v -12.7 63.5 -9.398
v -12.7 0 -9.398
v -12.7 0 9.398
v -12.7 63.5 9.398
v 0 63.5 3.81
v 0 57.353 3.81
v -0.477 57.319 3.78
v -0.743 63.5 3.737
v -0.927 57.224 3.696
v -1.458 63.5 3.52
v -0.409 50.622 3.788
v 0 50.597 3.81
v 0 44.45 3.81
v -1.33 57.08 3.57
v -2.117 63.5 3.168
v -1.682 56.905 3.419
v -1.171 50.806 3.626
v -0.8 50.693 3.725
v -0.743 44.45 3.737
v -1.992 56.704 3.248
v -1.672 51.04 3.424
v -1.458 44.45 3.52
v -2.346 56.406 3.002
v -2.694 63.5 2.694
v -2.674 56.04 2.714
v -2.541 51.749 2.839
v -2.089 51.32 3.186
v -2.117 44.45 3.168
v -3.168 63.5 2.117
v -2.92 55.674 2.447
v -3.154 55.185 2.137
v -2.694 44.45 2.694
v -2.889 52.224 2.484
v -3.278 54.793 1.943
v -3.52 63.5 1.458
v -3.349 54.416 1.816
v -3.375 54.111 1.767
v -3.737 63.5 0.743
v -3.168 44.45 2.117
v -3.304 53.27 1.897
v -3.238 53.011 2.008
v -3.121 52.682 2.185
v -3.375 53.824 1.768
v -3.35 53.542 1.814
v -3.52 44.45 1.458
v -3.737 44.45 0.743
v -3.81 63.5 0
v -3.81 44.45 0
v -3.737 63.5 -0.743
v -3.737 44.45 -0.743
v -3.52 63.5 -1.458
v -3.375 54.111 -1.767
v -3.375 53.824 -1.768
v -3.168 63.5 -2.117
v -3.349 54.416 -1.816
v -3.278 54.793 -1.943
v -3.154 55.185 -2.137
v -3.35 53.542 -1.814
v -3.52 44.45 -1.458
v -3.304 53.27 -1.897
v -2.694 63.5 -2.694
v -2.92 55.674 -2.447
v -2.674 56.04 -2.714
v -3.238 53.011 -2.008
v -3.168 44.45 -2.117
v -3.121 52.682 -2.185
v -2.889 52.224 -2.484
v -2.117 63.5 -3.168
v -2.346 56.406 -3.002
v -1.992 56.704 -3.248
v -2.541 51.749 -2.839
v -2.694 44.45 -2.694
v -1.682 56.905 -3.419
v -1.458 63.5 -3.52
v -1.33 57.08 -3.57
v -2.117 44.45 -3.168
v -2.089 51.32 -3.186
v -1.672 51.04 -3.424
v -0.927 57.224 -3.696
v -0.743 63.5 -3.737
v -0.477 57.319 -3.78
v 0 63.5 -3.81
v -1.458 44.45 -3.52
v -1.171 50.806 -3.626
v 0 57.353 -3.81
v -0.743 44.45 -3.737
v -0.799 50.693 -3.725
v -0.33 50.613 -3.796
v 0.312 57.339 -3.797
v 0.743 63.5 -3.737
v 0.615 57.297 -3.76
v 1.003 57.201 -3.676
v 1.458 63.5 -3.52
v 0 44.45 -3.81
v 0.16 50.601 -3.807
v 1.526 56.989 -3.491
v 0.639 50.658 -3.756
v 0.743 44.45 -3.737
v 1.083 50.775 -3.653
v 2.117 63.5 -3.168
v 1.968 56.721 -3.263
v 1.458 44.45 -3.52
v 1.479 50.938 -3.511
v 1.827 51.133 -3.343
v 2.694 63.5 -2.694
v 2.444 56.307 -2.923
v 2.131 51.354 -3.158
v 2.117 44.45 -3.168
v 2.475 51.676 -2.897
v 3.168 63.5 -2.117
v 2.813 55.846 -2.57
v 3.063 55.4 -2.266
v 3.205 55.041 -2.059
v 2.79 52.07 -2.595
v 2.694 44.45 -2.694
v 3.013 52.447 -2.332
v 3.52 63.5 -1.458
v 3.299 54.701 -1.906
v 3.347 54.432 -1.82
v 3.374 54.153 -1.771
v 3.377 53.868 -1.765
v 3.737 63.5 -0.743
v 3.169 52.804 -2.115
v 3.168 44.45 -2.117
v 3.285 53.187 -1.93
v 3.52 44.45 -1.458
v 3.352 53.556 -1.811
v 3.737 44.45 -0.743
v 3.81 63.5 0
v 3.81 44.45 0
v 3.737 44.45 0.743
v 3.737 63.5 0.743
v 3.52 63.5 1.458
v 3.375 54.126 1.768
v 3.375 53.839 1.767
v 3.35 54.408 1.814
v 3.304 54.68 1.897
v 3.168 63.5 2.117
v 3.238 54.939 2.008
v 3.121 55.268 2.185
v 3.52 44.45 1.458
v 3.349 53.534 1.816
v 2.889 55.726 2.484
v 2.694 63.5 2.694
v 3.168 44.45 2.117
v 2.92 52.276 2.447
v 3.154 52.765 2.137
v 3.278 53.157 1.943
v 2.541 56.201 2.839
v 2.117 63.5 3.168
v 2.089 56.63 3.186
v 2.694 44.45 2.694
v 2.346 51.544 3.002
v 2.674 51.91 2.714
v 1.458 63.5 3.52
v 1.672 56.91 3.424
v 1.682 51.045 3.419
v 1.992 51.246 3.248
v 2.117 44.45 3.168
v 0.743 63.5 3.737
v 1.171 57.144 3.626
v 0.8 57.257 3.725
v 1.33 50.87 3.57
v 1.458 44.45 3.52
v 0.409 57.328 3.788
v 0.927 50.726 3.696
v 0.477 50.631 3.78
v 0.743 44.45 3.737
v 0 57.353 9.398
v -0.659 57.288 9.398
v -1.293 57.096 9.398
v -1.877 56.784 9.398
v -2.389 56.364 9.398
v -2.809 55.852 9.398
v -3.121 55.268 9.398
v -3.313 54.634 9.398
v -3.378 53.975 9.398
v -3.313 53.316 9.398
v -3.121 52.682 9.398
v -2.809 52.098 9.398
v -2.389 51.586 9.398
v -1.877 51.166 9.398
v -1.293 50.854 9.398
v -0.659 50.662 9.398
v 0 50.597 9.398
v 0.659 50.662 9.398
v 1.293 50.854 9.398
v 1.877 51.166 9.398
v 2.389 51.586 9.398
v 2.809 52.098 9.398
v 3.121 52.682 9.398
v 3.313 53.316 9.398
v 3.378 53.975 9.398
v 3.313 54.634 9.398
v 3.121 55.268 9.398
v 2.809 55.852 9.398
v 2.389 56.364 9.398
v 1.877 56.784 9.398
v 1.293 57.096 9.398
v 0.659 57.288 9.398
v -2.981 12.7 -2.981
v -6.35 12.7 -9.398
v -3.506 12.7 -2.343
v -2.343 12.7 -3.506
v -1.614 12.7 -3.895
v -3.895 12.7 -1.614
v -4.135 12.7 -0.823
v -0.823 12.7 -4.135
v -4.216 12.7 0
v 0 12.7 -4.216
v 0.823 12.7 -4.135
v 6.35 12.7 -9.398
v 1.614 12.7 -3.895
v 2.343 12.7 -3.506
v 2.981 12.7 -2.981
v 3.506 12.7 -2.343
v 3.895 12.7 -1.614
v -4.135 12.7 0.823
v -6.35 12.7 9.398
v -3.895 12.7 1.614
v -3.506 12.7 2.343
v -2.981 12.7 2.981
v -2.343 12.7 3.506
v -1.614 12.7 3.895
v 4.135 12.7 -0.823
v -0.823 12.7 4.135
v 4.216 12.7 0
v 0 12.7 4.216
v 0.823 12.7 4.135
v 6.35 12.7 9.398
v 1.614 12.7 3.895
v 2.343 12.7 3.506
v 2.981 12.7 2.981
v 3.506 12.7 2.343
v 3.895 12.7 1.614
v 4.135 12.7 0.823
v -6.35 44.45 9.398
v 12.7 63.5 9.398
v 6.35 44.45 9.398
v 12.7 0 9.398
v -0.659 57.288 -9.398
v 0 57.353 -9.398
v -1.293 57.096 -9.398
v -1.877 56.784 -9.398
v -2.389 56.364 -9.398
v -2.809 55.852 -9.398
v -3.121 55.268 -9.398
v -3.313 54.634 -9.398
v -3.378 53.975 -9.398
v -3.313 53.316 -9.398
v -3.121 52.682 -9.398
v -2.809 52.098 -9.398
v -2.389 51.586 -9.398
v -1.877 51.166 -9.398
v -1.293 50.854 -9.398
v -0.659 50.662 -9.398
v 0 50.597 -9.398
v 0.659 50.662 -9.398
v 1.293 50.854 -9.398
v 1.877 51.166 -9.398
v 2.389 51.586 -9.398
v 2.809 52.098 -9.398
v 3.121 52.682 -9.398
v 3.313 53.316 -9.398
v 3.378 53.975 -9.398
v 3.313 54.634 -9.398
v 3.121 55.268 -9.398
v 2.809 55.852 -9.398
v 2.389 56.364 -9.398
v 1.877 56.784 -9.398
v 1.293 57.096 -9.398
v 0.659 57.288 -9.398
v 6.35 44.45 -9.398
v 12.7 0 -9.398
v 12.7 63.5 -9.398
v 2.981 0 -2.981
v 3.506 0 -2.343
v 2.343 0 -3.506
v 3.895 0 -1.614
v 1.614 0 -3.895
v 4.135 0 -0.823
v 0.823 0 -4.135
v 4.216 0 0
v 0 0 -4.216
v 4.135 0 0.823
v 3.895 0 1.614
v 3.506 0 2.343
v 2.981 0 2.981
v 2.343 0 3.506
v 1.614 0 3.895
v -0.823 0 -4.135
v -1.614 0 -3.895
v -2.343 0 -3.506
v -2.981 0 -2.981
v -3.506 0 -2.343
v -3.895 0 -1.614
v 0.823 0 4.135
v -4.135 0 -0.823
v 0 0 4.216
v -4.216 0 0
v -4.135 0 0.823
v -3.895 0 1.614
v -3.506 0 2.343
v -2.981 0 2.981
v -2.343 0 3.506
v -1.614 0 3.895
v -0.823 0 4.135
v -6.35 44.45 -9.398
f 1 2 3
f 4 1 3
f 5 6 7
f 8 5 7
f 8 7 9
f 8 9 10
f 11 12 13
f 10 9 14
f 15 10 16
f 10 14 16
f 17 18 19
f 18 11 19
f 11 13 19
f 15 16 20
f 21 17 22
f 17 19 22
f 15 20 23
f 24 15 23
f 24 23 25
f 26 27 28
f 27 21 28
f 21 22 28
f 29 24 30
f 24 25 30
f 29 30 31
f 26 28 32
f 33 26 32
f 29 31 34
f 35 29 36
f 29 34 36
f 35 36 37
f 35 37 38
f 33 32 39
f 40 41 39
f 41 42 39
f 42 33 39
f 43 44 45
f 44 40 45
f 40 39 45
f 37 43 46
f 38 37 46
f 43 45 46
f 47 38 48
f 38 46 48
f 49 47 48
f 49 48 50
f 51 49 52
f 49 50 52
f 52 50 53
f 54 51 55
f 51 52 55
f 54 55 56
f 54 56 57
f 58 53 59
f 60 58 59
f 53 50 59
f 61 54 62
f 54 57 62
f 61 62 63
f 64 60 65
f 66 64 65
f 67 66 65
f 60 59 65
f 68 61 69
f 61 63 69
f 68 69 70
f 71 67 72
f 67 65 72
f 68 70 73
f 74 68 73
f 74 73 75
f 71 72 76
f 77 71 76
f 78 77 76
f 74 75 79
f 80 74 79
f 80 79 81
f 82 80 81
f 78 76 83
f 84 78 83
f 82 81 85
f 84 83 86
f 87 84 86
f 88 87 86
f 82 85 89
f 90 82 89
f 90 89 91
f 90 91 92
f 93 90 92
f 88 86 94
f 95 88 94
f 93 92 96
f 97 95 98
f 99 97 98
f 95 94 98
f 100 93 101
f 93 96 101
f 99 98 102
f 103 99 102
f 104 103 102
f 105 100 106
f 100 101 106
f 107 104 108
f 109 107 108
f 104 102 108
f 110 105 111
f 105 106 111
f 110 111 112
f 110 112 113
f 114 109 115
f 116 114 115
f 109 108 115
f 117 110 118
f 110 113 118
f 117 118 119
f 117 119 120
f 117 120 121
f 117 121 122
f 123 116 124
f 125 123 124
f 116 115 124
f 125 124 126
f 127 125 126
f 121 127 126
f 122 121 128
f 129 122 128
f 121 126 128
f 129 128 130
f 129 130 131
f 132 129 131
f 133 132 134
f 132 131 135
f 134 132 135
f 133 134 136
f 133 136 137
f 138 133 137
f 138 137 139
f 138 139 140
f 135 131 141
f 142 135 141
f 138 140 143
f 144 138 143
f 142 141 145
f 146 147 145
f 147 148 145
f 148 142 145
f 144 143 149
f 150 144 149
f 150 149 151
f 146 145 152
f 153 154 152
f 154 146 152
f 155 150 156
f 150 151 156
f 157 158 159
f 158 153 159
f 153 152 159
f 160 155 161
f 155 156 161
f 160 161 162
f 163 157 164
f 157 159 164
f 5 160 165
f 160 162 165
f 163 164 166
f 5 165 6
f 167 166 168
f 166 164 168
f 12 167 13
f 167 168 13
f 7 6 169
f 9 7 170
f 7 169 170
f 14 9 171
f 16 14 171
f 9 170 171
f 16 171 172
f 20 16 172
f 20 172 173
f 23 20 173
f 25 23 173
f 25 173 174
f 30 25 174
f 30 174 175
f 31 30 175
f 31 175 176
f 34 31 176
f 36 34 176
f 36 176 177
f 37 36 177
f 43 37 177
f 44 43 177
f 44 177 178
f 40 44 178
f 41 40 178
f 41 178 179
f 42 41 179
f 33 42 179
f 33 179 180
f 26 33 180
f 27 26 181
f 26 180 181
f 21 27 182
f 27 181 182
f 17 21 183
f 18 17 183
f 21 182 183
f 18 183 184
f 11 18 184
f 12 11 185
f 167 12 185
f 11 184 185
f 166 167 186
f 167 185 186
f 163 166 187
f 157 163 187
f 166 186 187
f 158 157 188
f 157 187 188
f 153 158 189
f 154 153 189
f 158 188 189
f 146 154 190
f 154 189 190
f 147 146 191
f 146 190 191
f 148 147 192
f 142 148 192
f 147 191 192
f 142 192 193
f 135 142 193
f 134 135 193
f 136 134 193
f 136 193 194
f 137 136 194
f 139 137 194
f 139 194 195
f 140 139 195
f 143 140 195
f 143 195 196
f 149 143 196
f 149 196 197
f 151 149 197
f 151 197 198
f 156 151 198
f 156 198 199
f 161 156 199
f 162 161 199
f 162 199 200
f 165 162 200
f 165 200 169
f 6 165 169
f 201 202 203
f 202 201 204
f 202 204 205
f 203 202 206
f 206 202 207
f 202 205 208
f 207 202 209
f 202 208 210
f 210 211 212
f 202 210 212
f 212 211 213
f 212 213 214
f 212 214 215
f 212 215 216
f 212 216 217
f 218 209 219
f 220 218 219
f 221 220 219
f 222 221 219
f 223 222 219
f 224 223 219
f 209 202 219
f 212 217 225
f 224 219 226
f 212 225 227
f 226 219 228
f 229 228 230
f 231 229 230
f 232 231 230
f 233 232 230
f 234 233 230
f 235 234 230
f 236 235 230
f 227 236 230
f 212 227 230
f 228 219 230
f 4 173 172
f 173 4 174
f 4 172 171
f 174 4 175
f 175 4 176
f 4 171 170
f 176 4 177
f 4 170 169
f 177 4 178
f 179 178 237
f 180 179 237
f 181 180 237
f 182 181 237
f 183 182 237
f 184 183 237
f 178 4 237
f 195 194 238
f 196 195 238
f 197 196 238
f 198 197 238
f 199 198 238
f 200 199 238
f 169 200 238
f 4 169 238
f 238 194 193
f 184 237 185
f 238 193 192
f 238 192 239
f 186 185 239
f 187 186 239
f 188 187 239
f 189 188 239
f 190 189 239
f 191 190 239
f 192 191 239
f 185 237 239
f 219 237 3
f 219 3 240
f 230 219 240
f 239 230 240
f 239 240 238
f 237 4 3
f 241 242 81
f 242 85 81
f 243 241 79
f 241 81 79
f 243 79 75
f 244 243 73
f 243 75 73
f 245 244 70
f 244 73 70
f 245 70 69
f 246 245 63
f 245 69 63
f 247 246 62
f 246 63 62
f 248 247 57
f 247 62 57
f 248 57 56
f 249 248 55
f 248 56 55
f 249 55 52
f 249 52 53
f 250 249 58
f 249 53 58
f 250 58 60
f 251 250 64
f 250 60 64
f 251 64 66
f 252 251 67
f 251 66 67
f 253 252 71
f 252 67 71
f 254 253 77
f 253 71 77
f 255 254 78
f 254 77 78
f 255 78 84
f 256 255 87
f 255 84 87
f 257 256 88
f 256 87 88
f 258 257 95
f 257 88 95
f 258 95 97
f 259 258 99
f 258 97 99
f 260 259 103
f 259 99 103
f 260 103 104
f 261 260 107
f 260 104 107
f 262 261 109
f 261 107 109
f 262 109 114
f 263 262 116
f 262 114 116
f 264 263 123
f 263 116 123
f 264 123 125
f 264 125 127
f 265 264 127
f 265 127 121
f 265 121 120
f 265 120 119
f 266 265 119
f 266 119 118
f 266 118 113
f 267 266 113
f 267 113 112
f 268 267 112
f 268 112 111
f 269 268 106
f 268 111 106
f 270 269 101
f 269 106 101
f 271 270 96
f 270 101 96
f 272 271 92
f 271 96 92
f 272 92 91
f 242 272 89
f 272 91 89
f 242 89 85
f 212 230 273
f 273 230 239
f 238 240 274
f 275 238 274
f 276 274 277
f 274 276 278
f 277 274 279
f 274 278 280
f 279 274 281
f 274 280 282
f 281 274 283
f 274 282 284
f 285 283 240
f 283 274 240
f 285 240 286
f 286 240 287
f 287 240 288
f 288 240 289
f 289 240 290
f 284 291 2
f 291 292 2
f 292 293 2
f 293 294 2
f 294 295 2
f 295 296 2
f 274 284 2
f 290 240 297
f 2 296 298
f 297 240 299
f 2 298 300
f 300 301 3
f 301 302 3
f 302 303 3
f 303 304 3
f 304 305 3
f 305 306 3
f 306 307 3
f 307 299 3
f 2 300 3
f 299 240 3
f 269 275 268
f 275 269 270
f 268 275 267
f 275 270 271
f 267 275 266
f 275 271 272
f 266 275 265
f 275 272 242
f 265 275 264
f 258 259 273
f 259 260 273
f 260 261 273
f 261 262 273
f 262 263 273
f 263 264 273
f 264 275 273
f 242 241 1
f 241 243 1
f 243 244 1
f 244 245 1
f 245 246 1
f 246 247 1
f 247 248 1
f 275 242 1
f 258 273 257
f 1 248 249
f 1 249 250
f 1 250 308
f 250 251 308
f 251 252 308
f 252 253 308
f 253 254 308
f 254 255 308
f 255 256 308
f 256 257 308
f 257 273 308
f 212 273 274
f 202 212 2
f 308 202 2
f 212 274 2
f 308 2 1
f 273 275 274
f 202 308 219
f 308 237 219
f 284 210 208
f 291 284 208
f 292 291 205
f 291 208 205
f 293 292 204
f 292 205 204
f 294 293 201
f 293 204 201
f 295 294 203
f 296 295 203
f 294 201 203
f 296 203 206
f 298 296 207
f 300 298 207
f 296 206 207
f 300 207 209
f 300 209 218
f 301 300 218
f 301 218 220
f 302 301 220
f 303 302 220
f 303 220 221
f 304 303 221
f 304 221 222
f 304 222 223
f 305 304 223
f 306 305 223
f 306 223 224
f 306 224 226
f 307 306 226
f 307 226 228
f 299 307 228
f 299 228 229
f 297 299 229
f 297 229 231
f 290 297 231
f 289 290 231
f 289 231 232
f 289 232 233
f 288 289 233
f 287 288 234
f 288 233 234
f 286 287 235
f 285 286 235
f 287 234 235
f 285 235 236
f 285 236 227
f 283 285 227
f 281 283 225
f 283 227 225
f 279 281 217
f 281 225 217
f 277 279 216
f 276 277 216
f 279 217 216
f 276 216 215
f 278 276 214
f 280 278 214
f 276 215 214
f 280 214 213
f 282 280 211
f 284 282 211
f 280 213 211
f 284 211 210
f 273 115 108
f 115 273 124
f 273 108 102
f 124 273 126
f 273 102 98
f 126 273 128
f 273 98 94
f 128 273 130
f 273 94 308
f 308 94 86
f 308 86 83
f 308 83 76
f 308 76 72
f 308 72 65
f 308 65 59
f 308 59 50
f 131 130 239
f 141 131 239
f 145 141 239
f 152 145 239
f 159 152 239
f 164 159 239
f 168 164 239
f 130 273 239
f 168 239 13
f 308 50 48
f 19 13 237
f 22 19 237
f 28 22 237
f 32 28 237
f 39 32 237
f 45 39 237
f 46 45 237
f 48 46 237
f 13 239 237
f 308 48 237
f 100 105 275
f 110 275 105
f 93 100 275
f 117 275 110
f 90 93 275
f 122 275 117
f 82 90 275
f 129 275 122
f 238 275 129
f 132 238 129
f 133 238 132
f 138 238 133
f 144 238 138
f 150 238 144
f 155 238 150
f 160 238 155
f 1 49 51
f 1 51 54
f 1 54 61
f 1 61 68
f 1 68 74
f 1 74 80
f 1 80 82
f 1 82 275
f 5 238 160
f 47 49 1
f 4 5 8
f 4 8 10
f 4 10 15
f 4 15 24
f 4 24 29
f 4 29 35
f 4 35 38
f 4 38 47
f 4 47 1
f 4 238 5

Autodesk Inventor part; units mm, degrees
ref_plane "YZ Plane" through (0, 0, 0) normal (1, 0, 0) x (0, 1, 0)
ref_plane "XZ Plane" through (0, 0, 0) normal (0, 1, 0) x (-1, 0, 0)
ref_plane "XY Plane" through (0, 0, 0) normal (0, 0, 1) x (1, 0, 0)
sketch "Sketch7" plane through (0, 0, 0) normal (0, 1, 0) x (-1, 0, 0)
  line L0 (12.7, 9.398) -> (-12.7, 9.398)
  line L1 (-12.7, 9.398) -> (-12.7, -9.398)
  line L2 (-12.7, -9.398) -> (12.7, -9.398)
  line L3 (12.7, -9.398) -> (12.7, 9.398)
  line L4 (12.7, 9.398) -> (-12.7, -9.398) construction
  line L5 (-12.7, 9.398) -> (12.7, -9.398) construction
  point P0 (0, 0)
  dimension "d53" = 18.796
  dimension "d54" = 25.4
extrude "Extrusion4" add sketch "Sketch7" along normal blind 63.5
sketch "Sketch8" plane through (0, 0, 0) normal (0, -1, 0) x (1, 0, 0)
  point P0 (0, 0)
  point P1 (0, 0)
hole "Hole7" at (0, 0, 0) direction (0, 1, 0) diameter 8.4328 depth 12.7 clearance for "Flat Head Machine Screw (82)" size "5/16" standard "Ansi Unified Screw Threads"
sketch "Sketch10" plane through (12.7, 0, -9.398) normal (0, 0, -1) x (-1, 0, 0)
  line L0 (25.4, 63.5) -> (0, 63.5) construction
  line L1 (12.7, 63.5) -> (12.7, 0) construction
  line L2 (25.4, 0) -> (0, 0) construction
  point P0 (12.7, 53.975)
  dimension "d77" = 9.525
hole "Hole8" at (0, 53.975, -9.398) direction (0, 0, 1) diameter 6.7564 end through all clearance for "Flat Head Machine Screw (82)" size "1/4" standard "Ansi Unified Screw Threads"
sketch "Sketch11" plane through (-12.7, 0, 9.398) normal (0, 0, 1) x (1, 0, 0)
  line L0 (12.7, 0) -> (12.7, 63.5) construction
  line L1 (0, 63.5) -> (25.4, 63.5) construction
  line L2 (19.05, 12.7) -> (19.05, 44.45)
  line L3 (19.05, 44.45) -> (6.35, 44.45)
  line L4 (6.35, 44.45) -> (6.35, 12.7)
  line L5 (6.35, 12.7) -> (19.05, 12.7)
  line L6 (19.05, 12.7) -> (6.35, 44.45) construction
  line L7 (19.05, 44.45) -> (6.35, 12.7) construction
  line L8 (0, 0) -> (25.4, 0) projected
  point P0 (12.7, 28.575)
  dimension "d85" = 12.7
  dimension "d86" = 31.75
  dimension "d87" = 12.7
extrude "Extrusion5" cut sketch "Sketch11" against normal through all
sketch "Sketch12" plane through (0, 63.5, 0) normal (0, 1, 0) x (1, 0, 0)
  point P0 (0, 0)
  point P1 (0, 0)
hole "Hole9" at (0, 63.5, 0) direction (0, -1, 0) diameter 7.62 depth 19.05 tip angle 118
properties part number "BracketForEndOfDartActuator"
